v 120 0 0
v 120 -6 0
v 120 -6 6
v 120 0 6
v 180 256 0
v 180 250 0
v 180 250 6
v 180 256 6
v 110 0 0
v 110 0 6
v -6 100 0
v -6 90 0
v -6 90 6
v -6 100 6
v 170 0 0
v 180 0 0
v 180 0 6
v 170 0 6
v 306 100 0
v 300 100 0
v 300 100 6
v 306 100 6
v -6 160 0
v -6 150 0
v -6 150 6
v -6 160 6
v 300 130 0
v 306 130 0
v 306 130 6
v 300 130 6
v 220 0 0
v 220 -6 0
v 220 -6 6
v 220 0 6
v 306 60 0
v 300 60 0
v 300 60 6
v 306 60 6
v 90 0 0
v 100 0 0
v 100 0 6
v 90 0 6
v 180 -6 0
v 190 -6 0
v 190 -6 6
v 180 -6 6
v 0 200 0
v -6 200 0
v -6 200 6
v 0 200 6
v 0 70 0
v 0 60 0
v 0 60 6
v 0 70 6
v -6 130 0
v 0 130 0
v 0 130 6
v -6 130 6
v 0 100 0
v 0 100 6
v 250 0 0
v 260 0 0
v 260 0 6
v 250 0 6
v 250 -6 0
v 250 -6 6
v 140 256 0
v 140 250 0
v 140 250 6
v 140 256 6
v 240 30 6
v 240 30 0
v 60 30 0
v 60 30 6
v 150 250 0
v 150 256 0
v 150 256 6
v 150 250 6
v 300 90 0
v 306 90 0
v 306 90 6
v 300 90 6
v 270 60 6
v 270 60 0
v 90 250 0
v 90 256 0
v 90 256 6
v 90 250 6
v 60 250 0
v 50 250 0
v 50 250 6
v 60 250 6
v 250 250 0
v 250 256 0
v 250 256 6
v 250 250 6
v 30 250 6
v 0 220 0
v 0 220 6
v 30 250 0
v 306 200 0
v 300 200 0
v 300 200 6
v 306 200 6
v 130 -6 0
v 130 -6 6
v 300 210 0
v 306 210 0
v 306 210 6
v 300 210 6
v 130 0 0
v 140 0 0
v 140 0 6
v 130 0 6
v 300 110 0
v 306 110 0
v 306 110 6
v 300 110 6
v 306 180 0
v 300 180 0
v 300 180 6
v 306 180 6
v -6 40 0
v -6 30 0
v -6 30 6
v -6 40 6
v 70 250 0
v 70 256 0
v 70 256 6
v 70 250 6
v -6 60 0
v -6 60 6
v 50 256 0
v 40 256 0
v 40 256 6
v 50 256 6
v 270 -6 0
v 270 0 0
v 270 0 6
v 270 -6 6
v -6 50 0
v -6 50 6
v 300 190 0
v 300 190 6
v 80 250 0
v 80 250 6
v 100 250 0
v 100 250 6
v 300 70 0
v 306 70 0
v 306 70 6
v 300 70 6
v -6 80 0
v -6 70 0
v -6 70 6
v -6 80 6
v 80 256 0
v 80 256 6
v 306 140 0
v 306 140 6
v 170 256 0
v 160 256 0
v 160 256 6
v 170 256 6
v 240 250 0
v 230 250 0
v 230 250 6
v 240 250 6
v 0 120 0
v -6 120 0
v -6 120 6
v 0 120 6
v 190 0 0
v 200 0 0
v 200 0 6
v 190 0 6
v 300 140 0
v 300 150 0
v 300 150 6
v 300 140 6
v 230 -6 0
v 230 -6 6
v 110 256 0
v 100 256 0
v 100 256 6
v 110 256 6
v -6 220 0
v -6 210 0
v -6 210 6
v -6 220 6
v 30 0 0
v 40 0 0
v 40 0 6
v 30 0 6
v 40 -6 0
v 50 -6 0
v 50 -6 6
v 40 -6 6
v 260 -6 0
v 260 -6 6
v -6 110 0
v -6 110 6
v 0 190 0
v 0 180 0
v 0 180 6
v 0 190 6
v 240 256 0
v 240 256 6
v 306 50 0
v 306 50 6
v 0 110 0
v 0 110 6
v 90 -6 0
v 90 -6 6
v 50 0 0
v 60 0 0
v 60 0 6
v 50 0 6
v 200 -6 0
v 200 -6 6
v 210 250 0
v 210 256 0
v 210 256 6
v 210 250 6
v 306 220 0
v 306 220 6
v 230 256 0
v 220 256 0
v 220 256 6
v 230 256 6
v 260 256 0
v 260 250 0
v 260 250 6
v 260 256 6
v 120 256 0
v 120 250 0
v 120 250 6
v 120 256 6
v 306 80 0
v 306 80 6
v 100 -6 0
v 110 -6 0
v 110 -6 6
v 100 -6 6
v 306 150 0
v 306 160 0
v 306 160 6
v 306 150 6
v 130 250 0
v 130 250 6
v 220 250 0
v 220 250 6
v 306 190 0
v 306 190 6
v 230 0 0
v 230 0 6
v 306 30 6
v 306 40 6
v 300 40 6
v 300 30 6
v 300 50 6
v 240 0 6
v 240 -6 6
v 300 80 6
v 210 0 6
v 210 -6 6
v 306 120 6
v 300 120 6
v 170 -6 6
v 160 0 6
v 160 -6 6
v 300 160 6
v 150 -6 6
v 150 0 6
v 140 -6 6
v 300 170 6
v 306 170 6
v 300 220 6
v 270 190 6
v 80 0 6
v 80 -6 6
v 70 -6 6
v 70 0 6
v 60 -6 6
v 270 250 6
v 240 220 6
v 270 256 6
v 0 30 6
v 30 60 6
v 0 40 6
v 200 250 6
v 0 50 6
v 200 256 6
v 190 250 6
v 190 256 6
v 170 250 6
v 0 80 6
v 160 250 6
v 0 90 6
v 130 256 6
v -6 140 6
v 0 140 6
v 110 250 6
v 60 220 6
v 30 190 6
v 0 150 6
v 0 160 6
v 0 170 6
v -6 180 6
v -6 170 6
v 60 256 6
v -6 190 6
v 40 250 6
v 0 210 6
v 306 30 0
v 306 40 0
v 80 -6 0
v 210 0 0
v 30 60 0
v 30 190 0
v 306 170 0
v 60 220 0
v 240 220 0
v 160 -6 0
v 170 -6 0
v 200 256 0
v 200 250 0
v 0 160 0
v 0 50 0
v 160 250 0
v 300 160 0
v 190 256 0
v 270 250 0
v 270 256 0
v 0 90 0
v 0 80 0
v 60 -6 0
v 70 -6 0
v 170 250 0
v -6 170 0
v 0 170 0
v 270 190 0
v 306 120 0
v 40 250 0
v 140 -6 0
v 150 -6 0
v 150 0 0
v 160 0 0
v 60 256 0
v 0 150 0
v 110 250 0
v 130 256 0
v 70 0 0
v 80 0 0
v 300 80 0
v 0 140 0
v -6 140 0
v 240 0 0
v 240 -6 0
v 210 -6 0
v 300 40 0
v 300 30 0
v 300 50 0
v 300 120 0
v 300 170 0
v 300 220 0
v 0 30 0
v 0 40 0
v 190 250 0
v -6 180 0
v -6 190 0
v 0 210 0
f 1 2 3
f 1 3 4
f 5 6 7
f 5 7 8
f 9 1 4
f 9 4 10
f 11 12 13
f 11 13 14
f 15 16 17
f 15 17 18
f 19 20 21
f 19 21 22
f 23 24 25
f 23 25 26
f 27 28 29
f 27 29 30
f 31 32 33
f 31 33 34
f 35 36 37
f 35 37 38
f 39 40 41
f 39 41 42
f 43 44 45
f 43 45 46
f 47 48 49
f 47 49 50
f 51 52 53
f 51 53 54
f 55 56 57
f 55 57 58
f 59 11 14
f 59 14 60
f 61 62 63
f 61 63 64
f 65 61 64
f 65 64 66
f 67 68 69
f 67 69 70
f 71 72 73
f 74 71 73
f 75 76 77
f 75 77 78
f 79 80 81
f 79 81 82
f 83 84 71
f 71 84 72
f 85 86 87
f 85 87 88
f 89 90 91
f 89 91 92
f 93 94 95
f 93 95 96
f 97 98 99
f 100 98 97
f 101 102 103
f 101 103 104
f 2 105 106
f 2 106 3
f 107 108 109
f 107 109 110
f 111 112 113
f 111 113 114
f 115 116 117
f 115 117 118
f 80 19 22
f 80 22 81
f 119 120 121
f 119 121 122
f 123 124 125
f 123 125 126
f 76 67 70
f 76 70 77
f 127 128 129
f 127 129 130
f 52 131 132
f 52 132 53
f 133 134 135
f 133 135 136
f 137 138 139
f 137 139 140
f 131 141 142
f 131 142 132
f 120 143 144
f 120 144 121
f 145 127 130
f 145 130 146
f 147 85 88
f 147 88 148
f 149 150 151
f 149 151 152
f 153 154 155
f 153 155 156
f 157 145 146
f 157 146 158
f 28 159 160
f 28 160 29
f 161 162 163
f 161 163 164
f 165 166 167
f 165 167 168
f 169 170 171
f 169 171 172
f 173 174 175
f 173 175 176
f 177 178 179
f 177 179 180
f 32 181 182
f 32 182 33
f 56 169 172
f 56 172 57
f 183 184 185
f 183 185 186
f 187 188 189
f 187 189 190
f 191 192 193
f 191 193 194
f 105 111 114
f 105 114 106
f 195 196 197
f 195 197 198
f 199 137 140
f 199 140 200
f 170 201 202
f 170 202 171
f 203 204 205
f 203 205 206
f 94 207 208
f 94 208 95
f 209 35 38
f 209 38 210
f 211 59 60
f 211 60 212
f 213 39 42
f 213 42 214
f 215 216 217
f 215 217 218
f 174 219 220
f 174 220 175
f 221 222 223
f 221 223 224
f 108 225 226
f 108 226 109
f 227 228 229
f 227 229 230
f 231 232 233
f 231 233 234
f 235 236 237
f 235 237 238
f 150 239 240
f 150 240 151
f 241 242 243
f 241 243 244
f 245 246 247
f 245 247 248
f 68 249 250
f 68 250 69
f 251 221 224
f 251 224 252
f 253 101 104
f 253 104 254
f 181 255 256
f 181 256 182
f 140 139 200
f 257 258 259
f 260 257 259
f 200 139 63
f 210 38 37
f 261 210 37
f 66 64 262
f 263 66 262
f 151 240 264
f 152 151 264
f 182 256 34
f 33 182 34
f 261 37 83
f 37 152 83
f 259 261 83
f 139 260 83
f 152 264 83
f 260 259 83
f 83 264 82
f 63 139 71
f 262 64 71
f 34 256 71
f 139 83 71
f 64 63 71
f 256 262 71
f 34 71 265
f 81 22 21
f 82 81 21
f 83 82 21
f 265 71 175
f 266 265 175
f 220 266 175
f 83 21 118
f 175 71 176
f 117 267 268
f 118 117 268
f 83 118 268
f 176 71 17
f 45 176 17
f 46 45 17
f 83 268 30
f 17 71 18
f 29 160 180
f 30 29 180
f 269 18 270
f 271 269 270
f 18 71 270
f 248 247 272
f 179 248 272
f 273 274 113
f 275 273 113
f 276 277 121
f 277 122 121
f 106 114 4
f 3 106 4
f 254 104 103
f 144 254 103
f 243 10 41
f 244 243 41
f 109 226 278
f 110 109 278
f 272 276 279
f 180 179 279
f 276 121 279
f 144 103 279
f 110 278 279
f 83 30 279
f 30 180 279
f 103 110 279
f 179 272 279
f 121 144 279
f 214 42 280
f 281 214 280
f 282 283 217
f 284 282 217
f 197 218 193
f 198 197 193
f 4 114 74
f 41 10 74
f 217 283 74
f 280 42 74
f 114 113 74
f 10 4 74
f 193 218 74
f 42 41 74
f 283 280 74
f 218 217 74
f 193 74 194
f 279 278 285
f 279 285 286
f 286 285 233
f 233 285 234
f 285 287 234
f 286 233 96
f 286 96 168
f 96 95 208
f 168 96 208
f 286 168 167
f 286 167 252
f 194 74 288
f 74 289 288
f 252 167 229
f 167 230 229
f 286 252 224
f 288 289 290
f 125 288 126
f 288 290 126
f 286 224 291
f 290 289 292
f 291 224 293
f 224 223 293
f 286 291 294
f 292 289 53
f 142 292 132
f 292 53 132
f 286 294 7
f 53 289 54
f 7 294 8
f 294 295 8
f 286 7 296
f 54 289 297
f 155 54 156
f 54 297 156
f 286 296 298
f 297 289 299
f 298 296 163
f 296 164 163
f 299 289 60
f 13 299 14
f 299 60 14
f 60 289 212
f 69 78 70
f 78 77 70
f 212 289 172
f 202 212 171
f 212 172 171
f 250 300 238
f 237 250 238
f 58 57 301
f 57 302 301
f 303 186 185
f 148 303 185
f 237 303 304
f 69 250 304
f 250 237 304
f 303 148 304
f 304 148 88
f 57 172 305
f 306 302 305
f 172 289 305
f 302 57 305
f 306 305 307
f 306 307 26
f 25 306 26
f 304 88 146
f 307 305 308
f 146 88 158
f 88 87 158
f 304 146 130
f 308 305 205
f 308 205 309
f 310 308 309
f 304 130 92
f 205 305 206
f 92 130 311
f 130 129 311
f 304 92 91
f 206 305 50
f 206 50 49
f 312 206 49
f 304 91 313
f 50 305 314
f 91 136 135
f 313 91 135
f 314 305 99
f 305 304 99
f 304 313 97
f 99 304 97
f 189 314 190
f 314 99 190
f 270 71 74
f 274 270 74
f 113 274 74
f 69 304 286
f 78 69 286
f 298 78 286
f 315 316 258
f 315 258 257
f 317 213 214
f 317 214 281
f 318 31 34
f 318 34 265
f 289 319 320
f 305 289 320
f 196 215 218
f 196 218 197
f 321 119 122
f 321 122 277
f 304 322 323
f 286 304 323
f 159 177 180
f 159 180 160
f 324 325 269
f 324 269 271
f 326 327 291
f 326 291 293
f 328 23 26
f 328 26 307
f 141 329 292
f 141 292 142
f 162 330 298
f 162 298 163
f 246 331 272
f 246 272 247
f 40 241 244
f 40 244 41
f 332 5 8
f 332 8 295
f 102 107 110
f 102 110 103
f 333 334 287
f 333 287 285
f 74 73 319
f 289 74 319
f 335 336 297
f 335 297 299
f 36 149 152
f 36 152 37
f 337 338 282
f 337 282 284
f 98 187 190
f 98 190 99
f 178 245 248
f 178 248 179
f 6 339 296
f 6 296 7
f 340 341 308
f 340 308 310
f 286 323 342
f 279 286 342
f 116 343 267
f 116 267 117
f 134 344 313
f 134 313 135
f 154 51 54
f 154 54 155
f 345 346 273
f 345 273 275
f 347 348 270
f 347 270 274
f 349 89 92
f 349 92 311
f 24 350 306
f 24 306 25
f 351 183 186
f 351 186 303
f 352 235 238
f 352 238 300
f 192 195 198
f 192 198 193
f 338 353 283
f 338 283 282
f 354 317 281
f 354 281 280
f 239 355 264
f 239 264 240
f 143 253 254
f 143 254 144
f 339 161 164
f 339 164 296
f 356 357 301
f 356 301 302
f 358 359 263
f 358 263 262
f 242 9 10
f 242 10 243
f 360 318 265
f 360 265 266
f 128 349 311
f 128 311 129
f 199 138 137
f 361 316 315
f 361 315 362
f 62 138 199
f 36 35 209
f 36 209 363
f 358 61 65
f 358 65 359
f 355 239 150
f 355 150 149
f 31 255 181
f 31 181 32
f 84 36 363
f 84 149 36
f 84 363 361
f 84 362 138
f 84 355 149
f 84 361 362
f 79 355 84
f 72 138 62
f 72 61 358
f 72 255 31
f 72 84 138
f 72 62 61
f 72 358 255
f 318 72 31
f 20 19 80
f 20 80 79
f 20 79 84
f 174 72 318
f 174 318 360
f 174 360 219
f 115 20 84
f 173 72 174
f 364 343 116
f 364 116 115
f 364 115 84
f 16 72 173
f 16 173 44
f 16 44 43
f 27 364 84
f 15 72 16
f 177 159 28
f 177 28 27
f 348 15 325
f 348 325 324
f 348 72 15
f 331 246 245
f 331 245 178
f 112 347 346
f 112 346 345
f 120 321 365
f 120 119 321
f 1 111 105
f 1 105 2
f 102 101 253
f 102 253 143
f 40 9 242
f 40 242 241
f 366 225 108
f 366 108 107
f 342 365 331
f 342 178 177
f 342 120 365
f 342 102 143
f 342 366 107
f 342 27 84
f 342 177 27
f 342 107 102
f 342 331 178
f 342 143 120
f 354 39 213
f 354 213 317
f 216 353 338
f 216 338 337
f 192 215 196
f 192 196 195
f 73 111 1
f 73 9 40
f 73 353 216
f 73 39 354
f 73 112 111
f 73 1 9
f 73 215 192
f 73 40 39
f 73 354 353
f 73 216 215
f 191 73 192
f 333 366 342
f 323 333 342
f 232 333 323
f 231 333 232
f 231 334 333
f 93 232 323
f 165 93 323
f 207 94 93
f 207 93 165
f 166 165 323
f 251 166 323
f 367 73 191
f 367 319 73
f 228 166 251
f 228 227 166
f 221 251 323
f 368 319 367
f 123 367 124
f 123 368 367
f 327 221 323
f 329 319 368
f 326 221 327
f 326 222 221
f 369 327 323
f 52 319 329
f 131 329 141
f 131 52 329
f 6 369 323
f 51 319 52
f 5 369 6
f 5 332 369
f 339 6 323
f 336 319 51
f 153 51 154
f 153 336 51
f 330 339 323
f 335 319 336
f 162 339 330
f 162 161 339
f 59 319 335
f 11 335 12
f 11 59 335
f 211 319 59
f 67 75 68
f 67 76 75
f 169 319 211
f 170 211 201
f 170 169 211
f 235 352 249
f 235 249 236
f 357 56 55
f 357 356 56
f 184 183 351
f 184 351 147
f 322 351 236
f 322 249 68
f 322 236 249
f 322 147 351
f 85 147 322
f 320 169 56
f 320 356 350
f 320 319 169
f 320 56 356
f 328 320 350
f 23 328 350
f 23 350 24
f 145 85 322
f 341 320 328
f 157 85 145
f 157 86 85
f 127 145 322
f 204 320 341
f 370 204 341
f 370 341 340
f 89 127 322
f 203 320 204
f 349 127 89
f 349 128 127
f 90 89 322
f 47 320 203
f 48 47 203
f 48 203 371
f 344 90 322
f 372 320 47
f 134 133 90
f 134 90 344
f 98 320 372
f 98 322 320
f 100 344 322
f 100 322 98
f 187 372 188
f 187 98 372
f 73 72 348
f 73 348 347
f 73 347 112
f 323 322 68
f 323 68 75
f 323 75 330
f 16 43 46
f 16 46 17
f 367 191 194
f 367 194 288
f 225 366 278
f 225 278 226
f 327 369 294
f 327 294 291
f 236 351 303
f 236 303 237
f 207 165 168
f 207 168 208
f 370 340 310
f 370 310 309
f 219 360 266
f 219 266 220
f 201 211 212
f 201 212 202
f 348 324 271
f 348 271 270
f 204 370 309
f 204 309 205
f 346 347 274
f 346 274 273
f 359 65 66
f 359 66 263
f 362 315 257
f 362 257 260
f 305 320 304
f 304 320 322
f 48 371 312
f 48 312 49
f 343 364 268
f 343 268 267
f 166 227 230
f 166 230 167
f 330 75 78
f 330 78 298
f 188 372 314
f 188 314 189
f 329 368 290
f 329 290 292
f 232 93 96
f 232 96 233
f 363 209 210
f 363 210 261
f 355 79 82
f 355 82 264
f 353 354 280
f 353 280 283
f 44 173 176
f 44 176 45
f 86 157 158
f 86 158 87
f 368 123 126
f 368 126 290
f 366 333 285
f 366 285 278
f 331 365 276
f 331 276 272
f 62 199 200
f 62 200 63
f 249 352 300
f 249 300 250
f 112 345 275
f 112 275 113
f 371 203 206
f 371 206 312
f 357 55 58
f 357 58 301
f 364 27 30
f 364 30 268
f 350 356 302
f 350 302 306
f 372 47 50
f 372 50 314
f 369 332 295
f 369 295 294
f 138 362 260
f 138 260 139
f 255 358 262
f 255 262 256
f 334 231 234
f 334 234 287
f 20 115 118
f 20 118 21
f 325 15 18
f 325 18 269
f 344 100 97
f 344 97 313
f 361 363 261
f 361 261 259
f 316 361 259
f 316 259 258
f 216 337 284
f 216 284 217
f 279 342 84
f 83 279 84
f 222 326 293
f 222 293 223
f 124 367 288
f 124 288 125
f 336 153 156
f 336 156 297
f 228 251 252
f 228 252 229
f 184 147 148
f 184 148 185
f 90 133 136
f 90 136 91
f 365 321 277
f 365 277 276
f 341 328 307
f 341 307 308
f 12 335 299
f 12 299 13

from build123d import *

# Parameters (mm, degrees)
AUFSATZ_LINEAR_AUSTRAGEN2_DEPTH = 6


with BuildPart() as part:
    # Skizze1 → Aufsatz-Linear austragen2 (new body)
    with BuildSketch(Plane.XY):
        Polygon((30, 0), (0, 30), (-6, 30), (-6, 40), (0, 40), (0, 50), (-6, 50), (-6, 60), (0, 60), (0, 70), (-6, 70), (-6, 80), (0, 80), (0, 90), (-6, 90), (-6, 100), (0, 100), (0, 110), (-6, 110), (-6, 120), (0, 120), (0, 130), (-6, 130), (-6, 140), (0, 140), (0, 150), (-6, 150), (-6, 160), (0, 160), (0, 170), (-6, 170), (-6, 180), (0, 180), (0, 190), (-6, 190), (-6, 200), (0, 200), (0, 210), (-6, 210), (-6, 220), (0, 220), (30, 250), (40, 250), (40, 256), (50, 256), (50, 250), (60, 250), (60, 256), (70, 256), (70, 250), (80, 250), (80, 256), (90, 256), (90, 250), (100, 250), (100, 256), (110, 256), (110, 250), (120, 250), (120, 256), (130, 256), (130, 250), (140, 250), (140, 256), (150, 256), (150, 250), (160, 250), (160, 256), (170, 256), (170, 250), (180, 250), (180, 256), (190, 256), (190, 250), (200, 250), (200, 256), (210, 256), (210, 250), (220, 250), (220, 256), (230, 256), (230, 250), (240, 250), (240, 256), (250, 256), (250, 250), (260, 250), (260, 256), (270, 256), (270, 250), (300, 220), (306, 220), (306, 210), (300, 210), (300, 200), (306, 200), (306, 190), (300, 190), (300, 180), (306, 180), (306, 170), (300, 170), (300, 160), (306, 160), (306, 150), (300, 150), (300, 140), (306, 140), (306, 130), (300, 130), (300, 120), (306, 120), (306, 110), (300, 110), (300, 100), (306, 100), (306, 90), (300, 90), (300, 80), (306, 80), (306, 70), (300, 70), (300, 60), (306, 60), (306, 50), (300, 50), (300, 40), (306, 40), (306, 30), (300, 30), (270, 0), (270, -6), (260, -6), (260, 0), (250, 0), (250, -6), (240, -6), (240, 0), (230, 0), (230, -6), (220, -6), (220, 0), (210, 0), (210, -6), (200, -6), (200, 0), (190, 0), (190, -6), (180, -6), (180, 0), (170, 0), (170, -6), (160, -6), (160, 0), (150, 0), (150, -6), (140, -6), (140, 0), (130, 0), (130, -6), (120, -6), (120, 0), (110, 0), (110, -6), (100, -6), (100, 0), (90, 0), (90, -6), (80, -6), (80, 0), (70, 0), (70, -6), (60, -6), (60, 0), (50, 0), (50, -6), (40, -6), (40, 0), align=None)
        Polygon((30, 190), (60, 220), (240, 220), (270, 190), (270, 60), (240, 30), (60, 30), (30, 60), align=None, mode=Mode.SUBTRACT)
    extrude(amount=AUFSATZ_LINEAR_AUSTRAGEN2_DEPTH)


solid = part.part
